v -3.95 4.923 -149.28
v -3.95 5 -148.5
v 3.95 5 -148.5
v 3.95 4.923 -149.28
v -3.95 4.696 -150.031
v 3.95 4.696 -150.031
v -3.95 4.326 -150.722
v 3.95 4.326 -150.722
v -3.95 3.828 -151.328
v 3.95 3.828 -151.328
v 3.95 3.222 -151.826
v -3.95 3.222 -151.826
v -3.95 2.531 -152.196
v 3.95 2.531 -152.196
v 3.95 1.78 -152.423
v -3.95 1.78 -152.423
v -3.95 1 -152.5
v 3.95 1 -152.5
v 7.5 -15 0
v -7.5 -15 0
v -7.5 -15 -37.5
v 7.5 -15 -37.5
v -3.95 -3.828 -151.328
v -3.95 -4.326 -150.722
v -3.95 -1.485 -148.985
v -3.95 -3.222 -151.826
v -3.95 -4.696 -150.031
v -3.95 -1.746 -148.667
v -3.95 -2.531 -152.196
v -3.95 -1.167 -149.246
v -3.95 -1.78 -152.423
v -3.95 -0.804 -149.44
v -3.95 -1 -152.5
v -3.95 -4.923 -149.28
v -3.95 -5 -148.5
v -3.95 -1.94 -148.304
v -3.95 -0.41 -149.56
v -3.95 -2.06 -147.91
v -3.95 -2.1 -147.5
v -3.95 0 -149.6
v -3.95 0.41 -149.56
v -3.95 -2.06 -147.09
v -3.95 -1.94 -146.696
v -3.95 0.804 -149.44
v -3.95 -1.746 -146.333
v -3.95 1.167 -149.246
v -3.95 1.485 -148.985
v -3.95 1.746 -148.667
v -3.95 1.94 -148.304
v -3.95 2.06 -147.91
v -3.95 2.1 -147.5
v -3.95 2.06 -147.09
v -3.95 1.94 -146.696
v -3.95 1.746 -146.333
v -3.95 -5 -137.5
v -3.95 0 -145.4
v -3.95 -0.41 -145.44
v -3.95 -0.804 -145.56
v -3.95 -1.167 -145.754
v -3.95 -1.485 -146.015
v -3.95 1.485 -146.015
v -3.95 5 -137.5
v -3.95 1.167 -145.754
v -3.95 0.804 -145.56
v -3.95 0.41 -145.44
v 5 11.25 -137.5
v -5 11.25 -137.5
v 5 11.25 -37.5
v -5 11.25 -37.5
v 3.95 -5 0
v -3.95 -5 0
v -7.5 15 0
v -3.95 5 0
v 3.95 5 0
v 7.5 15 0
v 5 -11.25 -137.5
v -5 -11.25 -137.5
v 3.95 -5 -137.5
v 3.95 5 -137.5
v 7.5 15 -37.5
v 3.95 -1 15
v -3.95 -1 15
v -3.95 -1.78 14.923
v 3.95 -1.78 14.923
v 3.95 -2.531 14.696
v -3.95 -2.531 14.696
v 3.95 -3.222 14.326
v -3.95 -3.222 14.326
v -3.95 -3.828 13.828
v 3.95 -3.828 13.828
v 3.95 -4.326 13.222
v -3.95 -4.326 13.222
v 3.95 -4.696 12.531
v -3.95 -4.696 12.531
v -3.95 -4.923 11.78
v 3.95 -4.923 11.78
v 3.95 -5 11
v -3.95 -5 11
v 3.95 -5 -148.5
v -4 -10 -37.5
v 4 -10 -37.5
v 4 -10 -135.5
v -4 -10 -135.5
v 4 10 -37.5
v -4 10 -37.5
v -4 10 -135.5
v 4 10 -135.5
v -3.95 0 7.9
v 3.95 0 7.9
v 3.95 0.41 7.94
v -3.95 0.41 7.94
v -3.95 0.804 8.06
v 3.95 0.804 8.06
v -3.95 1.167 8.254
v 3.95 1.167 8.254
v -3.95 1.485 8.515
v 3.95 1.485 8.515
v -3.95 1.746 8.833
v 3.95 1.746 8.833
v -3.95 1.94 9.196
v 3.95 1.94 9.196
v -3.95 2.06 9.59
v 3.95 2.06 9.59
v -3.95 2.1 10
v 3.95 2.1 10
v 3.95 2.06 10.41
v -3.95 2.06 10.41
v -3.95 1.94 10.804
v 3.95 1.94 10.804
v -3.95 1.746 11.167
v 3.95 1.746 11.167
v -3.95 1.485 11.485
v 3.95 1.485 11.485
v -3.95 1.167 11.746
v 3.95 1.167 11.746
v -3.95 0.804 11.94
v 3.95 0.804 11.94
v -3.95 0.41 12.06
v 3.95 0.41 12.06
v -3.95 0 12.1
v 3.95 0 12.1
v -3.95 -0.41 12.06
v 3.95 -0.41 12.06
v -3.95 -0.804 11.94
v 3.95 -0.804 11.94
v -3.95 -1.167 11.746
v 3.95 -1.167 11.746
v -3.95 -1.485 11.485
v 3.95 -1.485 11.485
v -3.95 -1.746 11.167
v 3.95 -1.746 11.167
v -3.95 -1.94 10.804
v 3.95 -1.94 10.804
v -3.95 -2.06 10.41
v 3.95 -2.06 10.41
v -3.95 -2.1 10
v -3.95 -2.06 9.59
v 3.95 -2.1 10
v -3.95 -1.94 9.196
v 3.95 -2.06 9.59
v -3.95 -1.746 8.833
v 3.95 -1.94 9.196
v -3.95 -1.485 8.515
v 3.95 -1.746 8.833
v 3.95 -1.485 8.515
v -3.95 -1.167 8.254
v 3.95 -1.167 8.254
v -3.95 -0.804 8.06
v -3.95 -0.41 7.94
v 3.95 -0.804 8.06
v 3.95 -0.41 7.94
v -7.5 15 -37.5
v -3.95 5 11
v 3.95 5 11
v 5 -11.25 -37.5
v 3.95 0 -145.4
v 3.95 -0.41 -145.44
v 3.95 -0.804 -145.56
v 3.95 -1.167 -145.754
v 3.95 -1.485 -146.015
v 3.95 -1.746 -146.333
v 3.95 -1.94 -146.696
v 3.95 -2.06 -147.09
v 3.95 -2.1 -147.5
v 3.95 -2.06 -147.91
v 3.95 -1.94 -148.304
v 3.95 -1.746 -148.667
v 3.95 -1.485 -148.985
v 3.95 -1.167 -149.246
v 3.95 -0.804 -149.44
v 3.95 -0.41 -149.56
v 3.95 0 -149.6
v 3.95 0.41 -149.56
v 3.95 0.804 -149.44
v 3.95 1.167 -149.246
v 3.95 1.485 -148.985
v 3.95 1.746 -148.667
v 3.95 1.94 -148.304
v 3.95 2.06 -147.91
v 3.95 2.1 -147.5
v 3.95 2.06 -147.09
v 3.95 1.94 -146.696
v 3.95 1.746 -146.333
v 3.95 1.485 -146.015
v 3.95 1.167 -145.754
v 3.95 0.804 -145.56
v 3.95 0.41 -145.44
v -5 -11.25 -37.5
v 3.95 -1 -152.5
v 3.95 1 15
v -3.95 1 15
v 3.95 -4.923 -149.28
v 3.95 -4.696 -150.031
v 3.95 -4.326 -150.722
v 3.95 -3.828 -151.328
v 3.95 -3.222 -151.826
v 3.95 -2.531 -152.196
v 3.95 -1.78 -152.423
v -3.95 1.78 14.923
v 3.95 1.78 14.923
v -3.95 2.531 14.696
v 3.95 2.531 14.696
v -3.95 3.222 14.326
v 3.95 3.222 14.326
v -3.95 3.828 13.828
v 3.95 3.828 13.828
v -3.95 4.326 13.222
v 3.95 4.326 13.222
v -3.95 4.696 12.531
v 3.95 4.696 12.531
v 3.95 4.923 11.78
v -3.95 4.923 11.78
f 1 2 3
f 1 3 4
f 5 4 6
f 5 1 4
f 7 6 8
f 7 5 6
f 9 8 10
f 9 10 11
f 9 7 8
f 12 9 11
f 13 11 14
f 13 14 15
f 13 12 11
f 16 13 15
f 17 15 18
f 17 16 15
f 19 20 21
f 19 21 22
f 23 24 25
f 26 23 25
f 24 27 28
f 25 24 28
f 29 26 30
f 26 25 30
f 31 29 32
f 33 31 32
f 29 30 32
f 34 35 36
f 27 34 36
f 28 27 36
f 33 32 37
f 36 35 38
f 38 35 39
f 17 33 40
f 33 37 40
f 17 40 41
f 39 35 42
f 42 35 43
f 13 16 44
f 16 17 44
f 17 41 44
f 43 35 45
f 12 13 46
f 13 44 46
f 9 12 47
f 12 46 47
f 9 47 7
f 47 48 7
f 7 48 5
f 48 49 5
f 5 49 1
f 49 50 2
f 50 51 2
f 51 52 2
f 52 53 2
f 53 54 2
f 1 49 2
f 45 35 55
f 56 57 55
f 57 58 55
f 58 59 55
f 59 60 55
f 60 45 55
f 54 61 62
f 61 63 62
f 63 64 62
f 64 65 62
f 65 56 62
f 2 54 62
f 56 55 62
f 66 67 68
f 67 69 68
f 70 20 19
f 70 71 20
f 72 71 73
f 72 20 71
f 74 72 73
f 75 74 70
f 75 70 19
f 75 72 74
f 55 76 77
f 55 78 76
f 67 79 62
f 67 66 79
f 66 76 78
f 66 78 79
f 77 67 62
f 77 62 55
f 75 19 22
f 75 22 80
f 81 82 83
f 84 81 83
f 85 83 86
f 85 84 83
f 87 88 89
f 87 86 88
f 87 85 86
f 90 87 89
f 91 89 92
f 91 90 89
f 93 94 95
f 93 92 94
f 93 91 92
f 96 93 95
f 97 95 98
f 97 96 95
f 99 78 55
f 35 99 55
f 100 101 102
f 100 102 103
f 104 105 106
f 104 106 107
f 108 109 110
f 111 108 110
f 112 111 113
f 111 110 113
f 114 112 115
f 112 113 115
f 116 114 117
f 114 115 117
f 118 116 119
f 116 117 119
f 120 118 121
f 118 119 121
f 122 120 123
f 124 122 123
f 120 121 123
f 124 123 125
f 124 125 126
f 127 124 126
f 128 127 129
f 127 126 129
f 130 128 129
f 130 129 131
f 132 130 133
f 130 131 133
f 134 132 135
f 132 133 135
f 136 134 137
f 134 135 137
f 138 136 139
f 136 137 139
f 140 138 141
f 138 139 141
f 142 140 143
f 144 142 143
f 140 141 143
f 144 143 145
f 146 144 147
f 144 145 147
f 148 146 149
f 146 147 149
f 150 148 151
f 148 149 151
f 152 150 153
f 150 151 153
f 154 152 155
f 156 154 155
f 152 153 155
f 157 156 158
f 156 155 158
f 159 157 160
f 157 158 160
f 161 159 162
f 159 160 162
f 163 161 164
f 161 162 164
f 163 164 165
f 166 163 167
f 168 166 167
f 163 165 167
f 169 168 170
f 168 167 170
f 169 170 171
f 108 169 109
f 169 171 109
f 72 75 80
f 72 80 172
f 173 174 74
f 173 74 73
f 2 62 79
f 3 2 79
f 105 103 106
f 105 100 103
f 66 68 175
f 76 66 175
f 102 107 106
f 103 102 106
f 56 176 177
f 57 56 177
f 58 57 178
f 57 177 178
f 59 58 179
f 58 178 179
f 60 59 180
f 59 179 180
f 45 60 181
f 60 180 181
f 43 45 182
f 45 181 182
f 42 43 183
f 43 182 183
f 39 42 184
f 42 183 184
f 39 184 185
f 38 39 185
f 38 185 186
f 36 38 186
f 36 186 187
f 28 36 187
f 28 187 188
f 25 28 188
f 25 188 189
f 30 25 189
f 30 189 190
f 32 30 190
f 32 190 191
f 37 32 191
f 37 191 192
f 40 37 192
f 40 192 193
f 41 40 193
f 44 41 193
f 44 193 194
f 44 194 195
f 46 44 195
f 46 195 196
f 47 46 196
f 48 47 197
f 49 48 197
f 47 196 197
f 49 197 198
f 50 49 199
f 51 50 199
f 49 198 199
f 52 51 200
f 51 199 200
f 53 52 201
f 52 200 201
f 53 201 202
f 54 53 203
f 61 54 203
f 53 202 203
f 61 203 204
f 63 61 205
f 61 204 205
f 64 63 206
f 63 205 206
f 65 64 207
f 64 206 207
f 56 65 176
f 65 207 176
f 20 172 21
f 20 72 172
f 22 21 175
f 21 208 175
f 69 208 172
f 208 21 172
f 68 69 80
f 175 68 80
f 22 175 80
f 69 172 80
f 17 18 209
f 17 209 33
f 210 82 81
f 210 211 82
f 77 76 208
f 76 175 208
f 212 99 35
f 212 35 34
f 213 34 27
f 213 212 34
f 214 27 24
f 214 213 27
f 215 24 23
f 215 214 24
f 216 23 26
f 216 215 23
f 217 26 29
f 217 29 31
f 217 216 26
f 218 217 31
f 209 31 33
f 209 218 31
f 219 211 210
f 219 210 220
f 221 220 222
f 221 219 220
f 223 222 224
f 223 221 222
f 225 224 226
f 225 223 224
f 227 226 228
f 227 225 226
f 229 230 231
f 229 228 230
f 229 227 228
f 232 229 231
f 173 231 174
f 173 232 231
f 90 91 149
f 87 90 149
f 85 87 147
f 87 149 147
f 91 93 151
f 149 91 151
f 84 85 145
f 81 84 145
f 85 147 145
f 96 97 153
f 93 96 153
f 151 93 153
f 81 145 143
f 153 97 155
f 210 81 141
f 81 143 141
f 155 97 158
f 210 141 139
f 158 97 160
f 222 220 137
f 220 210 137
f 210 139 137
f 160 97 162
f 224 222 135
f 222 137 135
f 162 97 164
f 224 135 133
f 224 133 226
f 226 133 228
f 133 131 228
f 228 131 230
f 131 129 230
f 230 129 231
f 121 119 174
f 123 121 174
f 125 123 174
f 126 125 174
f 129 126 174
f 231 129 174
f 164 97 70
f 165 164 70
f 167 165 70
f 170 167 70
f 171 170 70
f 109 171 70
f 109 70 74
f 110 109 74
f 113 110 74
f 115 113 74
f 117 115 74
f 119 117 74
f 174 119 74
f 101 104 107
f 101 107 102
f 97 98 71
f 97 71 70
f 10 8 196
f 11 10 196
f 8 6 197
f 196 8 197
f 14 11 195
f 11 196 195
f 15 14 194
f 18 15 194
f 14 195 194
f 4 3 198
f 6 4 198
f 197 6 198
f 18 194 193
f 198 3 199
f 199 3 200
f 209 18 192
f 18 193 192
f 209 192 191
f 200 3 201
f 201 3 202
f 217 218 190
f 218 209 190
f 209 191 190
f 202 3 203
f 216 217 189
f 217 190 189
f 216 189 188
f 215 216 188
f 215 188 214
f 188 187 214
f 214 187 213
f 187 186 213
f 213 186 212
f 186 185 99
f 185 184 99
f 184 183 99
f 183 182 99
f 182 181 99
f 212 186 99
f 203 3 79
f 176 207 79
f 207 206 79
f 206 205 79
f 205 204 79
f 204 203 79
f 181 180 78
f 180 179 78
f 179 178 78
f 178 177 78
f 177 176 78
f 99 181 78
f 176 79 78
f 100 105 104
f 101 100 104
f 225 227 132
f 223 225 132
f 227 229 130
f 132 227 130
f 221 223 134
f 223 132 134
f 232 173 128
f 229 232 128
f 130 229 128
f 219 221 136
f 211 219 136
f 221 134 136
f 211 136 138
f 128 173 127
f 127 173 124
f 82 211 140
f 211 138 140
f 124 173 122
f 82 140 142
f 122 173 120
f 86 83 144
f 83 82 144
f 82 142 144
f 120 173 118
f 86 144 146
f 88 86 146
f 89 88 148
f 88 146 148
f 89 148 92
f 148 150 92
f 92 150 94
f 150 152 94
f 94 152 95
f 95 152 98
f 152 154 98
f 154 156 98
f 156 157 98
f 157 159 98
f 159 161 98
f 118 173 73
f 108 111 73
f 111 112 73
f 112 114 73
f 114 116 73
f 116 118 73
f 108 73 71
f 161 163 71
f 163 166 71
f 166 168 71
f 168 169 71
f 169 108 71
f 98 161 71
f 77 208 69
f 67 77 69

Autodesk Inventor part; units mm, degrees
ref_plane "YZ Plane" through (0, 0, 0) normal (1, 0, 0) x (0, 1, 0)
ref_plane "XZ Plane" through (0, 0, 0) normal (0, 1, 0) x (-1, 0, 0)
sketch "스케치1" plane through (0, 0, 0) normal (0, 0, 1) x (1, 0, 0)
  line L0 (-7.5, -15) -> (7.5, -15)
  line L1 (7.5, -15) -> (7.5, 15)
  line L2 (7.5, 15) -> (-7.5, 15)
  line L3 (-7.5, 15) -> (-7.5, -15)
  point P0 (0, 0)
  dimension "d0" = 15
  dimension "d1" = 30
  dimension "d2" = 15
  dimension "d3" = 7.5
extrude "돌출1" add sketch "스케치1" against normal blind 37.5
sketch "스케치2" plane through (0, 0, -37.5) normal (0, 0, -1) x (-1, 0, 0)
  line L0 (5, 11.25) -> (-5, 11.25)
  line L1 (-5, 11.25) -> (-5, -11.25)
  line L2 (-5, -11.25) -> (5, -11.25)
  line L3 (5, -11.25) -> (5, 11.25)
  line L4 (5, 11.25) -> (-5, -11.25) construction
  line L5 (-5, 11.25) -> (5, -11.25) construction
  line L6 (-4, -10) -> (4, -10)
  line L7 (4, -10) -> (4, 10)
  line L8 (4, 10) -> (-4, 10)
  line L9 (-4, 10) -> (-4, -10)
  line L10 (-4, -10) -> (4, 10) construction
  line L11 (4, -10) -> (-4, 10) construction
  point P0 (0, 0)
  dimension "d6" = 10
  dimension "d7" = 22.5
  dimension "d10" = 8
  dimension "d11" = 20
extrude "돌출2" add sketch "스케치2" along normal blind 100
sketch "스케치3" plane through (0, 0, 0) normal (0, 0, 1) x (1, 0, 0)
  line L0 (-3.95, -5) -> (3.95, -5)
  line L1 (3.95, -5) -> (3.95, 5)
  line L2 (3.95, 5) -> (-3.95, 5)
  line L3 (-3.95, 5) -> (-3.95, -5)
  line L4 (-3.95, -5) -> (3.95, 5) construction
  line L5 (3.95, -5) -> (-3.95, 5) construction
  point P0 (0, 0)
  dimension "d12" = 7.9
  dimension "d13" = 10
extrude "돌출3" add sketch "스케치3" along normal blind 15
sketch "스케치4" plane through (3.95, -5, 0) normal (1, 0, 0) x (0, 0, -1)
  circle A0 centre (-10, 5) radius 2.1
  line L0 (0, 0) -> (-15, 0) projected
  line L1 (-15, 0) -> (-15, 10) projected
  point P0 (0, 5)
  dimension "d16" = 4.2
  dimension "d17" = 5
  dimension "d18" = 5
extrude "돌출4" cut sketch "스케치4" against normal blind 15
sketch "스케치5" plane through (0, 0, -137.5) normal (0, 0, -1) x (-1, 0, 0)
  line L0 (-5, 11.25) -> (5, 11.25) projected
  line L1 (5, -11.25) -> (-5, -11.25) projected
  line L2 (5, 11.25) -> (-5, 11.25)
  line L3 (-5, 11.25) -> (-5, -11.25)
  line L4 (-5, -11.25) -> (5, -11.25)
  line L5 (5, -11.25) -> (5, 11.25)
  point P0 (7.5, 15)
  point P1 (-7.5, -15)
extrude "돌출5" add sketch "스케치5" against normal blind 2
ref_plane "작업 평면1" through (0, 0, -68.75) normal (0, 0, 1) x (1, 0, 0)
mirror "미러1" about plane through (0, 0, -68.75) normal (0, 0, 1) of "돌출3"
mirror "미러2" about plane through (0, 0, -68.75) normal (0, 0, 1) of "돌출4"
fillet "모깎기1" radius 4 4 edges at (0, -5, 15) (0, 5, 15) (0, -5, -152.5) (0, 5, -152.5)
properties part number "각도조절 액추에이터_최대" material "철, 가단"
